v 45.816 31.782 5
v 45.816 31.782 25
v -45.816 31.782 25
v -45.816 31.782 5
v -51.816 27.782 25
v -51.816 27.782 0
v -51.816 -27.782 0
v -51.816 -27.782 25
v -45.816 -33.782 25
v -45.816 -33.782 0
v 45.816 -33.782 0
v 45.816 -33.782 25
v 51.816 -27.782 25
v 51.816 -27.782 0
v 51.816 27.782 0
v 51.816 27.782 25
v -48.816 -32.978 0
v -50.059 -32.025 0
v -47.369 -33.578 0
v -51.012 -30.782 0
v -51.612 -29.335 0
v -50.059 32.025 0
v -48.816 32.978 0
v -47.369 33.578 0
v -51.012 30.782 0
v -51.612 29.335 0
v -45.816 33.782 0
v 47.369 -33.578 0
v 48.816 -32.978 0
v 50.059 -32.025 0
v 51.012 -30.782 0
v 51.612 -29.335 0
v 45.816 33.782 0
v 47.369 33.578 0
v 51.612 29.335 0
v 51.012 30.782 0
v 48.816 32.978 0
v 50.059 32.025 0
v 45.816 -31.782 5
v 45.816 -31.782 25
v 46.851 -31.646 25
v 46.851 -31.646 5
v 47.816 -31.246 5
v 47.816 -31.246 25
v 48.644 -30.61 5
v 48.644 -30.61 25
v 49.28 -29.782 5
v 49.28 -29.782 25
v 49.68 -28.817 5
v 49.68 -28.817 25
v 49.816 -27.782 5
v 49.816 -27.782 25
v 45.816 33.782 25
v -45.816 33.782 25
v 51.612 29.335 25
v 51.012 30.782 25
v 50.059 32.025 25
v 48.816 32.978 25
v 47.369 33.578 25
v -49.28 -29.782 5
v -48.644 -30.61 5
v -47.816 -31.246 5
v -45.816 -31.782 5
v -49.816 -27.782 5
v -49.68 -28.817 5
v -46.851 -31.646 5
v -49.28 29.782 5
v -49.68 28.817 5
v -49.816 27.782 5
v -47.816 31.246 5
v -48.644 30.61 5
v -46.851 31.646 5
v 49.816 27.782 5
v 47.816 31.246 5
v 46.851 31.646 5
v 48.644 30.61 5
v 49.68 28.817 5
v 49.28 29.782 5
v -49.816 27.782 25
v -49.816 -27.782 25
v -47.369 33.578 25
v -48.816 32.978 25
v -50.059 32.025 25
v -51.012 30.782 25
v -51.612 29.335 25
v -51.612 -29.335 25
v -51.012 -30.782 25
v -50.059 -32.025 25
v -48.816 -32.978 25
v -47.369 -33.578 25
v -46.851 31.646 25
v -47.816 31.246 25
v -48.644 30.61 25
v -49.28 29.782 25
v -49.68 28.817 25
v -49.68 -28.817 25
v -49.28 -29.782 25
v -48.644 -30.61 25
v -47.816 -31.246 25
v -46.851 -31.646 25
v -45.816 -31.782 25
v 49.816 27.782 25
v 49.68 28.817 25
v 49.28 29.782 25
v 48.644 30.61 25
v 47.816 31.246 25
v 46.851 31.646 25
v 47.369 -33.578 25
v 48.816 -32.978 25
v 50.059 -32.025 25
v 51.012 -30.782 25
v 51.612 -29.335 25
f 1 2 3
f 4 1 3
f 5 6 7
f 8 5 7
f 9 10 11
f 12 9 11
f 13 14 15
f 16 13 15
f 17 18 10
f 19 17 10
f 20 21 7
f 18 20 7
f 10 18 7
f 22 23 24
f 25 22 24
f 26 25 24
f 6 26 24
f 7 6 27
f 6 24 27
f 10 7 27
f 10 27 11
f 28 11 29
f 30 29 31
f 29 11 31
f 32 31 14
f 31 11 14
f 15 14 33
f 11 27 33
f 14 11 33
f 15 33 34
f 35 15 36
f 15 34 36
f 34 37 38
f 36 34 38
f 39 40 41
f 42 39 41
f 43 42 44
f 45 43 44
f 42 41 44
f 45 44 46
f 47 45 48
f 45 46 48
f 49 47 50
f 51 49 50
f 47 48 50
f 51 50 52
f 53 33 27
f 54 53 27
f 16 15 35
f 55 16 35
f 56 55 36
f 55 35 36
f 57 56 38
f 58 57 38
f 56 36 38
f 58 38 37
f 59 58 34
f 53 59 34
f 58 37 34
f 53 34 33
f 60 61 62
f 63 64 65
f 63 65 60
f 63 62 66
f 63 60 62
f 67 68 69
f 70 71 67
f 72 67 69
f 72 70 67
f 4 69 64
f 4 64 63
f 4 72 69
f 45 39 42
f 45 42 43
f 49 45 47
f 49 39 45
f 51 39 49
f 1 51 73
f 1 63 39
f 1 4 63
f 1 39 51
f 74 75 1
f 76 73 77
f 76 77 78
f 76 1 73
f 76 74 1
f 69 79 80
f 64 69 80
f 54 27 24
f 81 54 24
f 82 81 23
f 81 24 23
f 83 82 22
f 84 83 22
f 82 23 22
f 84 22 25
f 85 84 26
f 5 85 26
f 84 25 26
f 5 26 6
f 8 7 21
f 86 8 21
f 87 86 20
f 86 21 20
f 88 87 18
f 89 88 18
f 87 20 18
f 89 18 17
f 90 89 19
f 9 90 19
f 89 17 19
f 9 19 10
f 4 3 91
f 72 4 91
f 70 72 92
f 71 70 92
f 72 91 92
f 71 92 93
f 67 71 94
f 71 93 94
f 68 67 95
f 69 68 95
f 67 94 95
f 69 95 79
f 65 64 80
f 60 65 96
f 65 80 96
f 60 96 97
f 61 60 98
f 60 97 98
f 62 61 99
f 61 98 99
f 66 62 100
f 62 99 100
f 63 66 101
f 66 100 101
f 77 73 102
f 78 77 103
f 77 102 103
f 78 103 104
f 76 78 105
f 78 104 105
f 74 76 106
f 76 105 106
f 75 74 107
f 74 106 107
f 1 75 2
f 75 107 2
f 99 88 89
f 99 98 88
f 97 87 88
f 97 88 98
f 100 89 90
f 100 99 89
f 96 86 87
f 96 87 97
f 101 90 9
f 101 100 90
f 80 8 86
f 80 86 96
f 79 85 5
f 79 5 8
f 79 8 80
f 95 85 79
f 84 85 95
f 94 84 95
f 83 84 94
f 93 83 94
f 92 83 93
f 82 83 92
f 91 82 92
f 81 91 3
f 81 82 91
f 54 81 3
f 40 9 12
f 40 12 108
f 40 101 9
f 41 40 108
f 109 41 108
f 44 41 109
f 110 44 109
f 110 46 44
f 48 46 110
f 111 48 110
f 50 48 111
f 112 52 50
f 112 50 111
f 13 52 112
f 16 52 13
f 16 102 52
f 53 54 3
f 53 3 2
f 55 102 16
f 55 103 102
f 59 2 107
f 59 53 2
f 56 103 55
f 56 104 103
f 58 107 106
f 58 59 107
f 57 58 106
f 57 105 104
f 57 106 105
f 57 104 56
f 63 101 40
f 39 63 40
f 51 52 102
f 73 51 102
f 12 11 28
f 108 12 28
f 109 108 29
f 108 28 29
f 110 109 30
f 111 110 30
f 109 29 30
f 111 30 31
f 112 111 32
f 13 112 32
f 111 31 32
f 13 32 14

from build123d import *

# Parameters (mm, degrees)
F1_DEPTH = 25
F3_DEPTH = 20


with BuildPart() as f1:
    # F0 (on Top) → F1 (new body)
    with BuildSketch(Plane.XY):
        with BuildLine():
            Line((-45.816002, -33.782002), (45.816002, -33.782002))
            ThreePointArc((45.816002, -33.782002), (50.058642, -32.024642), (51.816002, -27.782002))
            Line((51.816002, -27.782002), (51.816002, 27.782002))
            ThreePointArc((51.816002, 27.782002), (50.058642, 32.024642), (45.816002, 33.782002))
            Line((45.816002, 33.782002), (-45.816002, 33.782002))
            ThreePointArc((-45.816002, 33.782002), (-50.058642, 32.024642), (-51.816002, 27.782002))
            Line((-51.816002, 27.782002), (-51.816002, -27.782002))
            ThreePointArc((-51.816002, -27.782002), (-50.058642, -32.024642), (-45.816002, -33.782002))
        make_face()
    extrude(amount=F1_DEPTH)

    # F2 (on face) → F3 (cut)
    with BuildSketch(Plane.XY.offset(25)):
        with BuildLine():
            ThreePointArc((45.816002, -31.782002), (48.644429, -30.610429), (49.816002, -27.782002))
            Line((49.816002, -27.782002), (49.816002, 27.782002))
            ThreePointArc((49.816002, 27.782002), (48.644429, 30.610429), (45.816002, 31.782002))
            Line((45.816002, 31.782002), (-45.816002, 31.782002))
            ThreePointArc((-45.816002, 31.782002), (-48.644429, 30.610429), (-49.816002, 27.782002))
            Line((-49.816002, 27.782002), (-49.816002, -27.782002))
            ThreePointArc((-49.816002, -27.782002), (-48.644429, -30.610429), (-45.816002, -31.782002))
            Line((-45.816002, -31.782002), (45.816002, -31.782002))
        make_face()
    extrude(amount=-F3_DEPTH, mode=Mode.SUBTRACT)


solid = f1.part
